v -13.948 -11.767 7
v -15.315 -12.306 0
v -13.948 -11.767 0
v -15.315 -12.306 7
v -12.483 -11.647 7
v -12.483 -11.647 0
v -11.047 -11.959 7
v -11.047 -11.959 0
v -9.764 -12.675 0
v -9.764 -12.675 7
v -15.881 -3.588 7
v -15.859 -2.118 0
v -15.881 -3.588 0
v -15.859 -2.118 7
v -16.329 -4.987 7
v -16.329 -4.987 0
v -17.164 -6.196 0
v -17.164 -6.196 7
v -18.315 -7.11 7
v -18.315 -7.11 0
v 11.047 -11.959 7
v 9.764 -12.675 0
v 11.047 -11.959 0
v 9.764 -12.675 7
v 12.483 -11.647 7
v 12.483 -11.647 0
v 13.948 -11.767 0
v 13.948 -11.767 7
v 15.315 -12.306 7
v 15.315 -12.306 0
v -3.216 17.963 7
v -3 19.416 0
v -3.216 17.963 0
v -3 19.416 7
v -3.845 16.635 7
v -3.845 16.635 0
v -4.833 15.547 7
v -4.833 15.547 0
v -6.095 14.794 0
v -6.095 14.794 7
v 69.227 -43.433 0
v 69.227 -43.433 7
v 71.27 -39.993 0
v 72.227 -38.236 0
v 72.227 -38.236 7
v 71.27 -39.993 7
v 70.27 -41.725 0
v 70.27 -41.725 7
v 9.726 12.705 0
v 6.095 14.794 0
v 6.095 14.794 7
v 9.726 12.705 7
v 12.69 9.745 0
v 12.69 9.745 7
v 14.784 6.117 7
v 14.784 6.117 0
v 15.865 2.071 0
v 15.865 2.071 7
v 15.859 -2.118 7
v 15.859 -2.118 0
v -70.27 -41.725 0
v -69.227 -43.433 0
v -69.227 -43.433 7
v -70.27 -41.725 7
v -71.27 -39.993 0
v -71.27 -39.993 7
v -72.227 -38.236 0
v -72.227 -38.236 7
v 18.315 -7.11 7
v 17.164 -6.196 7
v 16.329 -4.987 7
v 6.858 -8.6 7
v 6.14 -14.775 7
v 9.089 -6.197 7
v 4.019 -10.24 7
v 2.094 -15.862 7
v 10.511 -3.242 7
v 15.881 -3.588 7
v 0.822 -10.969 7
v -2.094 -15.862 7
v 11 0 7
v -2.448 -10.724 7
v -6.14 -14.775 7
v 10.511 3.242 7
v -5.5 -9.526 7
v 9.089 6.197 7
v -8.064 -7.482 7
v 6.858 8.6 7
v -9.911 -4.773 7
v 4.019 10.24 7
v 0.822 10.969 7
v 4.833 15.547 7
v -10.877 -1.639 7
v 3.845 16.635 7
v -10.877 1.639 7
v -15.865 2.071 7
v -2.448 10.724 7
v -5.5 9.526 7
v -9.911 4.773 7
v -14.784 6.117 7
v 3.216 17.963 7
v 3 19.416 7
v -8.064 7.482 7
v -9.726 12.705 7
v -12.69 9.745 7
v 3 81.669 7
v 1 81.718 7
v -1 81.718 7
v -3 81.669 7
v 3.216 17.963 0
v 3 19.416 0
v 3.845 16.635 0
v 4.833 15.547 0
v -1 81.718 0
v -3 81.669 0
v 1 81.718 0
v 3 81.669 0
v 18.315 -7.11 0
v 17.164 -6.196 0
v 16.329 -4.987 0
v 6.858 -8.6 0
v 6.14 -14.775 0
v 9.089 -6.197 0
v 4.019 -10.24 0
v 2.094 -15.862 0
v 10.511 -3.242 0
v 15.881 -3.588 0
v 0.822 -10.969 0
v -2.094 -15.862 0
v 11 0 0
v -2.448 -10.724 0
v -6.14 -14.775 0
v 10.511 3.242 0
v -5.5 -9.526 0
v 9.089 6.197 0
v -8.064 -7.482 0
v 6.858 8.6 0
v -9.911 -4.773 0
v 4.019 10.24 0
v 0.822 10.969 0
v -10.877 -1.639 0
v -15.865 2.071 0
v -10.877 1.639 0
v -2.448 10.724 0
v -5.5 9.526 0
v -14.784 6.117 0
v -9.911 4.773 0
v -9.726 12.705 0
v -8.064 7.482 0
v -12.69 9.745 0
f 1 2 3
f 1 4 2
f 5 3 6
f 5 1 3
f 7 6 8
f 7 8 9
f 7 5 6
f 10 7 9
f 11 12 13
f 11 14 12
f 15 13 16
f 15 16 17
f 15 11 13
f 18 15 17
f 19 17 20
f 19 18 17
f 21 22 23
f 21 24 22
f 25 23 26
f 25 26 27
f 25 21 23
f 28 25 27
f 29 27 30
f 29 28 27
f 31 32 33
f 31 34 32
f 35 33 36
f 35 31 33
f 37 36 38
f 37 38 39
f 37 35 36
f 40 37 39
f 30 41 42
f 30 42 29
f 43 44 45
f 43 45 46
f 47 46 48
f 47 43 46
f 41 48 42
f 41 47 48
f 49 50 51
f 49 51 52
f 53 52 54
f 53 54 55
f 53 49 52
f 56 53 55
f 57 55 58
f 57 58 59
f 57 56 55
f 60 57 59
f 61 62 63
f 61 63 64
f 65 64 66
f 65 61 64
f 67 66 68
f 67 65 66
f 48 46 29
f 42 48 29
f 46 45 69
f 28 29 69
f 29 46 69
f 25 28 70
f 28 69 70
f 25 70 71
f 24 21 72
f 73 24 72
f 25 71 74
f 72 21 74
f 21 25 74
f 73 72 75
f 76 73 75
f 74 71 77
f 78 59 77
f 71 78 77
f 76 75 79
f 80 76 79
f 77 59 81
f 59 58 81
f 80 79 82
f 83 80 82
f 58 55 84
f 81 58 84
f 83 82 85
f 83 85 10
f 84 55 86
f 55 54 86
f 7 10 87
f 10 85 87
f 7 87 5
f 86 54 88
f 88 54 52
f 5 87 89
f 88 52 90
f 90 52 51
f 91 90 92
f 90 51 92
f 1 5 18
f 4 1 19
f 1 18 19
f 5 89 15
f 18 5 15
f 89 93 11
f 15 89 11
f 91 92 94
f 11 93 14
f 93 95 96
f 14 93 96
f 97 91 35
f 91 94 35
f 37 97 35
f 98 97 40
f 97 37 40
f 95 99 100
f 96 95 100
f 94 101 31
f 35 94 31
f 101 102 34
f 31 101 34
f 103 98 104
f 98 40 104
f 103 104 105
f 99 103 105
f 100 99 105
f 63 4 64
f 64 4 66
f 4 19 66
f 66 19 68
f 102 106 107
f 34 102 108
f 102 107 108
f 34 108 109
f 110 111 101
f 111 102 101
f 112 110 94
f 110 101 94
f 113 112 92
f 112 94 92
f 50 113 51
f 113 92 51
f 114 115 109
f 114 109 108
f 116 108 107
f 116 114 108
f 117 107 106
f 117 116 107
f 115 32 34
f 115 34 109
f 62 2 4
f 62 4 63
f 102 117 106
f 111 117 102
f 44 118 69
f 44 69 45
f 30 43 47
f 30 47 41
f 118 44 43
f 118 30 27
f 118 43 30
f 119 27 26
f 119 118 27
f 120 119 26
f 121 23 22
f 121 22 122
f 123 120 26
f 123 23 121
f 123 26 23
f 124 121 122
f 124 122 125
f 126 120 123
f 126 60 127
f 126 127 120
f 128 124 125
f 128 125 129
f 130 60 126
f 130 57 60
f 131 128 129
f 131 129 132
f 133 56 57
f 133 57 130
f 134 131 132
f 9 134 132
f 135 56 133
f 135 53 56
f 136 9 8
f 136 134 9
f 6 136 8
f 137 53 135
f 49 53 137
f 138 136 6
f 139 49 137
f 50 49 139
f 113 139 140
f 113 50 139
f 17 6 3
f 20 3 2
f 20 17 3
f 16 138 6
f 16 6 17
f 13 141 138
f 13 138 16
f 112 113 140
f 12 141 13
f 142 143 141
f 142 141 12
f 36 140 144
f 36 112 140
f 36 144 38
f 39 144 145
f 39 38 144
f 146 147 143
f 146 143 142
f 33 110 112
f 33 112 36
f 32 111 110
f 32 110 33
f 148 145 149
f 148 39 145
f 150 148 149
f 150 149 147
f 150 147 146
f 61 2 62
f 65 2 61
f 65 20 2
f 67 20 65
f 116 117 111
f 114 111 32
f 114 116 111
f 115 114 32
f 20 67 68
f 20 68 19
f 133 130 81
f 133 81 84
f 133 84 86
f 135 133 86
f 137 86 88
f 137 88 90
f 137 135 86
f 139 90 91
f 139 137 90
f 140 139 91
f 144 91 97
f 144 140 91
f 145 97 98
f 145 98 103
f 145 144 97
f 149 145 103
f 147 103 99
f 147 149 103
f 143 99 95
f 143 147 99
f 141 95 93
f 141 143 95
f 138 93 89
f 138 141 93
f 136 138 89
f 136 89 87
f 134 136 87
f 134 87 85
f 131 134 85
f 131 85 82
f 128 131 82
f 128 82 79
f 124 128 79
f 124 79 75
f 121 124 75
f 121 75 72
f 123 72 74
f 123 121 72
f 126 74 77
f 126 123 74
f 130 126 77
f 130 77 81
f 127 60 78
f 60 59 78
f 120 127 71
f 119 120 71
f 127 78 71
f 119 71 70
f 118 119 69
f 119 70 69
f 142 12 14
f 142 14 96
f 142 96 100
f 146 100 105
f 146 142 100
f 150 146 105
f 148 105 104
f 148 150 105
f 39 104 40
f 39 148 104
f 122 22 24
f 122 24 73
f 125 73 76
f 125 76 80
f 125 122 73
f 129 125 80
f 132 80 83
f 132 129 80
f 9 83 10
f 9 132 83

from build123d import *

# Parameters (mm, degrees)
SKETCH1_R           = 11
BOSS_EXTRUDE1_DEPTH = 7
FILLET1_R           = 5


with BuildPart() as part:
    # Sketch1 → Boss-Extrude1 (new body)
    with BuildSketch(Plane.XY):
        with BuildLine():
            Line((-3, 15.716233646), (-3, 81.669056077))
            ThreePointArc((-3, 81.669056077), (0, 81.724137931), (3, 81.669056077))
            Line((3, 81.669056077), (3, 15.716233646))
            ThreePointArc((3, 15.716233646), (13.856406461, 8), (15.110657589, -5.260040611))
            Line((15.110657589, -5.260040611), (72.227477266, -38.236451827))
            ThreePointArc((72.227477266, -38.236451827), (70.775179551, -40.862068966), (69.227477266, -43.43260425))
            Line((69.227477266, -43.43260425), (12.110657589, -10.456193034))
            ThreePointArc((12.110657589, -10.456193034), (0, -16), (-12.110657589, -10.456193034))
            Line((-12.110657589, -10.456193034), (-69.227477266, -43.43260425))
            ThreePointArc((-69.227477266, -43.43260425), (-70.775179551, -40.862068966), (-72.227477266, -38.236451827))
            Line((-72.227477266, -38.236451827), (-15.110657589, -5.260040611))
            ThreePointArc((-15.110657589, -5.260040611), (-13.856406461, 8), (-3, 15.716233646))
        make_face()
        Circle(SKETCH1_R, mode=Mode.SUBTRACT)
    extrude(amount=BOSS_EXTRUDE1_DEPTH)

    # Fillet1
    fillet1_edges = [part.edges().sort_by_distance(p)[0] for p in [
        (-3, 15.716233646, 3.5),
        (3, 15.716233646, 3.5),
        (15.110657589, -5.260040611, 3.5),
        (12.110657589, -10.456193034, 3.5),
        (-12.110657589, -10.456193034, 3.5),
        (-15.110657589, -5.260040611, 3.5),
    ]]
    fillet(fillet1_edges, radius=FILLET1_R)


solid = part.part
